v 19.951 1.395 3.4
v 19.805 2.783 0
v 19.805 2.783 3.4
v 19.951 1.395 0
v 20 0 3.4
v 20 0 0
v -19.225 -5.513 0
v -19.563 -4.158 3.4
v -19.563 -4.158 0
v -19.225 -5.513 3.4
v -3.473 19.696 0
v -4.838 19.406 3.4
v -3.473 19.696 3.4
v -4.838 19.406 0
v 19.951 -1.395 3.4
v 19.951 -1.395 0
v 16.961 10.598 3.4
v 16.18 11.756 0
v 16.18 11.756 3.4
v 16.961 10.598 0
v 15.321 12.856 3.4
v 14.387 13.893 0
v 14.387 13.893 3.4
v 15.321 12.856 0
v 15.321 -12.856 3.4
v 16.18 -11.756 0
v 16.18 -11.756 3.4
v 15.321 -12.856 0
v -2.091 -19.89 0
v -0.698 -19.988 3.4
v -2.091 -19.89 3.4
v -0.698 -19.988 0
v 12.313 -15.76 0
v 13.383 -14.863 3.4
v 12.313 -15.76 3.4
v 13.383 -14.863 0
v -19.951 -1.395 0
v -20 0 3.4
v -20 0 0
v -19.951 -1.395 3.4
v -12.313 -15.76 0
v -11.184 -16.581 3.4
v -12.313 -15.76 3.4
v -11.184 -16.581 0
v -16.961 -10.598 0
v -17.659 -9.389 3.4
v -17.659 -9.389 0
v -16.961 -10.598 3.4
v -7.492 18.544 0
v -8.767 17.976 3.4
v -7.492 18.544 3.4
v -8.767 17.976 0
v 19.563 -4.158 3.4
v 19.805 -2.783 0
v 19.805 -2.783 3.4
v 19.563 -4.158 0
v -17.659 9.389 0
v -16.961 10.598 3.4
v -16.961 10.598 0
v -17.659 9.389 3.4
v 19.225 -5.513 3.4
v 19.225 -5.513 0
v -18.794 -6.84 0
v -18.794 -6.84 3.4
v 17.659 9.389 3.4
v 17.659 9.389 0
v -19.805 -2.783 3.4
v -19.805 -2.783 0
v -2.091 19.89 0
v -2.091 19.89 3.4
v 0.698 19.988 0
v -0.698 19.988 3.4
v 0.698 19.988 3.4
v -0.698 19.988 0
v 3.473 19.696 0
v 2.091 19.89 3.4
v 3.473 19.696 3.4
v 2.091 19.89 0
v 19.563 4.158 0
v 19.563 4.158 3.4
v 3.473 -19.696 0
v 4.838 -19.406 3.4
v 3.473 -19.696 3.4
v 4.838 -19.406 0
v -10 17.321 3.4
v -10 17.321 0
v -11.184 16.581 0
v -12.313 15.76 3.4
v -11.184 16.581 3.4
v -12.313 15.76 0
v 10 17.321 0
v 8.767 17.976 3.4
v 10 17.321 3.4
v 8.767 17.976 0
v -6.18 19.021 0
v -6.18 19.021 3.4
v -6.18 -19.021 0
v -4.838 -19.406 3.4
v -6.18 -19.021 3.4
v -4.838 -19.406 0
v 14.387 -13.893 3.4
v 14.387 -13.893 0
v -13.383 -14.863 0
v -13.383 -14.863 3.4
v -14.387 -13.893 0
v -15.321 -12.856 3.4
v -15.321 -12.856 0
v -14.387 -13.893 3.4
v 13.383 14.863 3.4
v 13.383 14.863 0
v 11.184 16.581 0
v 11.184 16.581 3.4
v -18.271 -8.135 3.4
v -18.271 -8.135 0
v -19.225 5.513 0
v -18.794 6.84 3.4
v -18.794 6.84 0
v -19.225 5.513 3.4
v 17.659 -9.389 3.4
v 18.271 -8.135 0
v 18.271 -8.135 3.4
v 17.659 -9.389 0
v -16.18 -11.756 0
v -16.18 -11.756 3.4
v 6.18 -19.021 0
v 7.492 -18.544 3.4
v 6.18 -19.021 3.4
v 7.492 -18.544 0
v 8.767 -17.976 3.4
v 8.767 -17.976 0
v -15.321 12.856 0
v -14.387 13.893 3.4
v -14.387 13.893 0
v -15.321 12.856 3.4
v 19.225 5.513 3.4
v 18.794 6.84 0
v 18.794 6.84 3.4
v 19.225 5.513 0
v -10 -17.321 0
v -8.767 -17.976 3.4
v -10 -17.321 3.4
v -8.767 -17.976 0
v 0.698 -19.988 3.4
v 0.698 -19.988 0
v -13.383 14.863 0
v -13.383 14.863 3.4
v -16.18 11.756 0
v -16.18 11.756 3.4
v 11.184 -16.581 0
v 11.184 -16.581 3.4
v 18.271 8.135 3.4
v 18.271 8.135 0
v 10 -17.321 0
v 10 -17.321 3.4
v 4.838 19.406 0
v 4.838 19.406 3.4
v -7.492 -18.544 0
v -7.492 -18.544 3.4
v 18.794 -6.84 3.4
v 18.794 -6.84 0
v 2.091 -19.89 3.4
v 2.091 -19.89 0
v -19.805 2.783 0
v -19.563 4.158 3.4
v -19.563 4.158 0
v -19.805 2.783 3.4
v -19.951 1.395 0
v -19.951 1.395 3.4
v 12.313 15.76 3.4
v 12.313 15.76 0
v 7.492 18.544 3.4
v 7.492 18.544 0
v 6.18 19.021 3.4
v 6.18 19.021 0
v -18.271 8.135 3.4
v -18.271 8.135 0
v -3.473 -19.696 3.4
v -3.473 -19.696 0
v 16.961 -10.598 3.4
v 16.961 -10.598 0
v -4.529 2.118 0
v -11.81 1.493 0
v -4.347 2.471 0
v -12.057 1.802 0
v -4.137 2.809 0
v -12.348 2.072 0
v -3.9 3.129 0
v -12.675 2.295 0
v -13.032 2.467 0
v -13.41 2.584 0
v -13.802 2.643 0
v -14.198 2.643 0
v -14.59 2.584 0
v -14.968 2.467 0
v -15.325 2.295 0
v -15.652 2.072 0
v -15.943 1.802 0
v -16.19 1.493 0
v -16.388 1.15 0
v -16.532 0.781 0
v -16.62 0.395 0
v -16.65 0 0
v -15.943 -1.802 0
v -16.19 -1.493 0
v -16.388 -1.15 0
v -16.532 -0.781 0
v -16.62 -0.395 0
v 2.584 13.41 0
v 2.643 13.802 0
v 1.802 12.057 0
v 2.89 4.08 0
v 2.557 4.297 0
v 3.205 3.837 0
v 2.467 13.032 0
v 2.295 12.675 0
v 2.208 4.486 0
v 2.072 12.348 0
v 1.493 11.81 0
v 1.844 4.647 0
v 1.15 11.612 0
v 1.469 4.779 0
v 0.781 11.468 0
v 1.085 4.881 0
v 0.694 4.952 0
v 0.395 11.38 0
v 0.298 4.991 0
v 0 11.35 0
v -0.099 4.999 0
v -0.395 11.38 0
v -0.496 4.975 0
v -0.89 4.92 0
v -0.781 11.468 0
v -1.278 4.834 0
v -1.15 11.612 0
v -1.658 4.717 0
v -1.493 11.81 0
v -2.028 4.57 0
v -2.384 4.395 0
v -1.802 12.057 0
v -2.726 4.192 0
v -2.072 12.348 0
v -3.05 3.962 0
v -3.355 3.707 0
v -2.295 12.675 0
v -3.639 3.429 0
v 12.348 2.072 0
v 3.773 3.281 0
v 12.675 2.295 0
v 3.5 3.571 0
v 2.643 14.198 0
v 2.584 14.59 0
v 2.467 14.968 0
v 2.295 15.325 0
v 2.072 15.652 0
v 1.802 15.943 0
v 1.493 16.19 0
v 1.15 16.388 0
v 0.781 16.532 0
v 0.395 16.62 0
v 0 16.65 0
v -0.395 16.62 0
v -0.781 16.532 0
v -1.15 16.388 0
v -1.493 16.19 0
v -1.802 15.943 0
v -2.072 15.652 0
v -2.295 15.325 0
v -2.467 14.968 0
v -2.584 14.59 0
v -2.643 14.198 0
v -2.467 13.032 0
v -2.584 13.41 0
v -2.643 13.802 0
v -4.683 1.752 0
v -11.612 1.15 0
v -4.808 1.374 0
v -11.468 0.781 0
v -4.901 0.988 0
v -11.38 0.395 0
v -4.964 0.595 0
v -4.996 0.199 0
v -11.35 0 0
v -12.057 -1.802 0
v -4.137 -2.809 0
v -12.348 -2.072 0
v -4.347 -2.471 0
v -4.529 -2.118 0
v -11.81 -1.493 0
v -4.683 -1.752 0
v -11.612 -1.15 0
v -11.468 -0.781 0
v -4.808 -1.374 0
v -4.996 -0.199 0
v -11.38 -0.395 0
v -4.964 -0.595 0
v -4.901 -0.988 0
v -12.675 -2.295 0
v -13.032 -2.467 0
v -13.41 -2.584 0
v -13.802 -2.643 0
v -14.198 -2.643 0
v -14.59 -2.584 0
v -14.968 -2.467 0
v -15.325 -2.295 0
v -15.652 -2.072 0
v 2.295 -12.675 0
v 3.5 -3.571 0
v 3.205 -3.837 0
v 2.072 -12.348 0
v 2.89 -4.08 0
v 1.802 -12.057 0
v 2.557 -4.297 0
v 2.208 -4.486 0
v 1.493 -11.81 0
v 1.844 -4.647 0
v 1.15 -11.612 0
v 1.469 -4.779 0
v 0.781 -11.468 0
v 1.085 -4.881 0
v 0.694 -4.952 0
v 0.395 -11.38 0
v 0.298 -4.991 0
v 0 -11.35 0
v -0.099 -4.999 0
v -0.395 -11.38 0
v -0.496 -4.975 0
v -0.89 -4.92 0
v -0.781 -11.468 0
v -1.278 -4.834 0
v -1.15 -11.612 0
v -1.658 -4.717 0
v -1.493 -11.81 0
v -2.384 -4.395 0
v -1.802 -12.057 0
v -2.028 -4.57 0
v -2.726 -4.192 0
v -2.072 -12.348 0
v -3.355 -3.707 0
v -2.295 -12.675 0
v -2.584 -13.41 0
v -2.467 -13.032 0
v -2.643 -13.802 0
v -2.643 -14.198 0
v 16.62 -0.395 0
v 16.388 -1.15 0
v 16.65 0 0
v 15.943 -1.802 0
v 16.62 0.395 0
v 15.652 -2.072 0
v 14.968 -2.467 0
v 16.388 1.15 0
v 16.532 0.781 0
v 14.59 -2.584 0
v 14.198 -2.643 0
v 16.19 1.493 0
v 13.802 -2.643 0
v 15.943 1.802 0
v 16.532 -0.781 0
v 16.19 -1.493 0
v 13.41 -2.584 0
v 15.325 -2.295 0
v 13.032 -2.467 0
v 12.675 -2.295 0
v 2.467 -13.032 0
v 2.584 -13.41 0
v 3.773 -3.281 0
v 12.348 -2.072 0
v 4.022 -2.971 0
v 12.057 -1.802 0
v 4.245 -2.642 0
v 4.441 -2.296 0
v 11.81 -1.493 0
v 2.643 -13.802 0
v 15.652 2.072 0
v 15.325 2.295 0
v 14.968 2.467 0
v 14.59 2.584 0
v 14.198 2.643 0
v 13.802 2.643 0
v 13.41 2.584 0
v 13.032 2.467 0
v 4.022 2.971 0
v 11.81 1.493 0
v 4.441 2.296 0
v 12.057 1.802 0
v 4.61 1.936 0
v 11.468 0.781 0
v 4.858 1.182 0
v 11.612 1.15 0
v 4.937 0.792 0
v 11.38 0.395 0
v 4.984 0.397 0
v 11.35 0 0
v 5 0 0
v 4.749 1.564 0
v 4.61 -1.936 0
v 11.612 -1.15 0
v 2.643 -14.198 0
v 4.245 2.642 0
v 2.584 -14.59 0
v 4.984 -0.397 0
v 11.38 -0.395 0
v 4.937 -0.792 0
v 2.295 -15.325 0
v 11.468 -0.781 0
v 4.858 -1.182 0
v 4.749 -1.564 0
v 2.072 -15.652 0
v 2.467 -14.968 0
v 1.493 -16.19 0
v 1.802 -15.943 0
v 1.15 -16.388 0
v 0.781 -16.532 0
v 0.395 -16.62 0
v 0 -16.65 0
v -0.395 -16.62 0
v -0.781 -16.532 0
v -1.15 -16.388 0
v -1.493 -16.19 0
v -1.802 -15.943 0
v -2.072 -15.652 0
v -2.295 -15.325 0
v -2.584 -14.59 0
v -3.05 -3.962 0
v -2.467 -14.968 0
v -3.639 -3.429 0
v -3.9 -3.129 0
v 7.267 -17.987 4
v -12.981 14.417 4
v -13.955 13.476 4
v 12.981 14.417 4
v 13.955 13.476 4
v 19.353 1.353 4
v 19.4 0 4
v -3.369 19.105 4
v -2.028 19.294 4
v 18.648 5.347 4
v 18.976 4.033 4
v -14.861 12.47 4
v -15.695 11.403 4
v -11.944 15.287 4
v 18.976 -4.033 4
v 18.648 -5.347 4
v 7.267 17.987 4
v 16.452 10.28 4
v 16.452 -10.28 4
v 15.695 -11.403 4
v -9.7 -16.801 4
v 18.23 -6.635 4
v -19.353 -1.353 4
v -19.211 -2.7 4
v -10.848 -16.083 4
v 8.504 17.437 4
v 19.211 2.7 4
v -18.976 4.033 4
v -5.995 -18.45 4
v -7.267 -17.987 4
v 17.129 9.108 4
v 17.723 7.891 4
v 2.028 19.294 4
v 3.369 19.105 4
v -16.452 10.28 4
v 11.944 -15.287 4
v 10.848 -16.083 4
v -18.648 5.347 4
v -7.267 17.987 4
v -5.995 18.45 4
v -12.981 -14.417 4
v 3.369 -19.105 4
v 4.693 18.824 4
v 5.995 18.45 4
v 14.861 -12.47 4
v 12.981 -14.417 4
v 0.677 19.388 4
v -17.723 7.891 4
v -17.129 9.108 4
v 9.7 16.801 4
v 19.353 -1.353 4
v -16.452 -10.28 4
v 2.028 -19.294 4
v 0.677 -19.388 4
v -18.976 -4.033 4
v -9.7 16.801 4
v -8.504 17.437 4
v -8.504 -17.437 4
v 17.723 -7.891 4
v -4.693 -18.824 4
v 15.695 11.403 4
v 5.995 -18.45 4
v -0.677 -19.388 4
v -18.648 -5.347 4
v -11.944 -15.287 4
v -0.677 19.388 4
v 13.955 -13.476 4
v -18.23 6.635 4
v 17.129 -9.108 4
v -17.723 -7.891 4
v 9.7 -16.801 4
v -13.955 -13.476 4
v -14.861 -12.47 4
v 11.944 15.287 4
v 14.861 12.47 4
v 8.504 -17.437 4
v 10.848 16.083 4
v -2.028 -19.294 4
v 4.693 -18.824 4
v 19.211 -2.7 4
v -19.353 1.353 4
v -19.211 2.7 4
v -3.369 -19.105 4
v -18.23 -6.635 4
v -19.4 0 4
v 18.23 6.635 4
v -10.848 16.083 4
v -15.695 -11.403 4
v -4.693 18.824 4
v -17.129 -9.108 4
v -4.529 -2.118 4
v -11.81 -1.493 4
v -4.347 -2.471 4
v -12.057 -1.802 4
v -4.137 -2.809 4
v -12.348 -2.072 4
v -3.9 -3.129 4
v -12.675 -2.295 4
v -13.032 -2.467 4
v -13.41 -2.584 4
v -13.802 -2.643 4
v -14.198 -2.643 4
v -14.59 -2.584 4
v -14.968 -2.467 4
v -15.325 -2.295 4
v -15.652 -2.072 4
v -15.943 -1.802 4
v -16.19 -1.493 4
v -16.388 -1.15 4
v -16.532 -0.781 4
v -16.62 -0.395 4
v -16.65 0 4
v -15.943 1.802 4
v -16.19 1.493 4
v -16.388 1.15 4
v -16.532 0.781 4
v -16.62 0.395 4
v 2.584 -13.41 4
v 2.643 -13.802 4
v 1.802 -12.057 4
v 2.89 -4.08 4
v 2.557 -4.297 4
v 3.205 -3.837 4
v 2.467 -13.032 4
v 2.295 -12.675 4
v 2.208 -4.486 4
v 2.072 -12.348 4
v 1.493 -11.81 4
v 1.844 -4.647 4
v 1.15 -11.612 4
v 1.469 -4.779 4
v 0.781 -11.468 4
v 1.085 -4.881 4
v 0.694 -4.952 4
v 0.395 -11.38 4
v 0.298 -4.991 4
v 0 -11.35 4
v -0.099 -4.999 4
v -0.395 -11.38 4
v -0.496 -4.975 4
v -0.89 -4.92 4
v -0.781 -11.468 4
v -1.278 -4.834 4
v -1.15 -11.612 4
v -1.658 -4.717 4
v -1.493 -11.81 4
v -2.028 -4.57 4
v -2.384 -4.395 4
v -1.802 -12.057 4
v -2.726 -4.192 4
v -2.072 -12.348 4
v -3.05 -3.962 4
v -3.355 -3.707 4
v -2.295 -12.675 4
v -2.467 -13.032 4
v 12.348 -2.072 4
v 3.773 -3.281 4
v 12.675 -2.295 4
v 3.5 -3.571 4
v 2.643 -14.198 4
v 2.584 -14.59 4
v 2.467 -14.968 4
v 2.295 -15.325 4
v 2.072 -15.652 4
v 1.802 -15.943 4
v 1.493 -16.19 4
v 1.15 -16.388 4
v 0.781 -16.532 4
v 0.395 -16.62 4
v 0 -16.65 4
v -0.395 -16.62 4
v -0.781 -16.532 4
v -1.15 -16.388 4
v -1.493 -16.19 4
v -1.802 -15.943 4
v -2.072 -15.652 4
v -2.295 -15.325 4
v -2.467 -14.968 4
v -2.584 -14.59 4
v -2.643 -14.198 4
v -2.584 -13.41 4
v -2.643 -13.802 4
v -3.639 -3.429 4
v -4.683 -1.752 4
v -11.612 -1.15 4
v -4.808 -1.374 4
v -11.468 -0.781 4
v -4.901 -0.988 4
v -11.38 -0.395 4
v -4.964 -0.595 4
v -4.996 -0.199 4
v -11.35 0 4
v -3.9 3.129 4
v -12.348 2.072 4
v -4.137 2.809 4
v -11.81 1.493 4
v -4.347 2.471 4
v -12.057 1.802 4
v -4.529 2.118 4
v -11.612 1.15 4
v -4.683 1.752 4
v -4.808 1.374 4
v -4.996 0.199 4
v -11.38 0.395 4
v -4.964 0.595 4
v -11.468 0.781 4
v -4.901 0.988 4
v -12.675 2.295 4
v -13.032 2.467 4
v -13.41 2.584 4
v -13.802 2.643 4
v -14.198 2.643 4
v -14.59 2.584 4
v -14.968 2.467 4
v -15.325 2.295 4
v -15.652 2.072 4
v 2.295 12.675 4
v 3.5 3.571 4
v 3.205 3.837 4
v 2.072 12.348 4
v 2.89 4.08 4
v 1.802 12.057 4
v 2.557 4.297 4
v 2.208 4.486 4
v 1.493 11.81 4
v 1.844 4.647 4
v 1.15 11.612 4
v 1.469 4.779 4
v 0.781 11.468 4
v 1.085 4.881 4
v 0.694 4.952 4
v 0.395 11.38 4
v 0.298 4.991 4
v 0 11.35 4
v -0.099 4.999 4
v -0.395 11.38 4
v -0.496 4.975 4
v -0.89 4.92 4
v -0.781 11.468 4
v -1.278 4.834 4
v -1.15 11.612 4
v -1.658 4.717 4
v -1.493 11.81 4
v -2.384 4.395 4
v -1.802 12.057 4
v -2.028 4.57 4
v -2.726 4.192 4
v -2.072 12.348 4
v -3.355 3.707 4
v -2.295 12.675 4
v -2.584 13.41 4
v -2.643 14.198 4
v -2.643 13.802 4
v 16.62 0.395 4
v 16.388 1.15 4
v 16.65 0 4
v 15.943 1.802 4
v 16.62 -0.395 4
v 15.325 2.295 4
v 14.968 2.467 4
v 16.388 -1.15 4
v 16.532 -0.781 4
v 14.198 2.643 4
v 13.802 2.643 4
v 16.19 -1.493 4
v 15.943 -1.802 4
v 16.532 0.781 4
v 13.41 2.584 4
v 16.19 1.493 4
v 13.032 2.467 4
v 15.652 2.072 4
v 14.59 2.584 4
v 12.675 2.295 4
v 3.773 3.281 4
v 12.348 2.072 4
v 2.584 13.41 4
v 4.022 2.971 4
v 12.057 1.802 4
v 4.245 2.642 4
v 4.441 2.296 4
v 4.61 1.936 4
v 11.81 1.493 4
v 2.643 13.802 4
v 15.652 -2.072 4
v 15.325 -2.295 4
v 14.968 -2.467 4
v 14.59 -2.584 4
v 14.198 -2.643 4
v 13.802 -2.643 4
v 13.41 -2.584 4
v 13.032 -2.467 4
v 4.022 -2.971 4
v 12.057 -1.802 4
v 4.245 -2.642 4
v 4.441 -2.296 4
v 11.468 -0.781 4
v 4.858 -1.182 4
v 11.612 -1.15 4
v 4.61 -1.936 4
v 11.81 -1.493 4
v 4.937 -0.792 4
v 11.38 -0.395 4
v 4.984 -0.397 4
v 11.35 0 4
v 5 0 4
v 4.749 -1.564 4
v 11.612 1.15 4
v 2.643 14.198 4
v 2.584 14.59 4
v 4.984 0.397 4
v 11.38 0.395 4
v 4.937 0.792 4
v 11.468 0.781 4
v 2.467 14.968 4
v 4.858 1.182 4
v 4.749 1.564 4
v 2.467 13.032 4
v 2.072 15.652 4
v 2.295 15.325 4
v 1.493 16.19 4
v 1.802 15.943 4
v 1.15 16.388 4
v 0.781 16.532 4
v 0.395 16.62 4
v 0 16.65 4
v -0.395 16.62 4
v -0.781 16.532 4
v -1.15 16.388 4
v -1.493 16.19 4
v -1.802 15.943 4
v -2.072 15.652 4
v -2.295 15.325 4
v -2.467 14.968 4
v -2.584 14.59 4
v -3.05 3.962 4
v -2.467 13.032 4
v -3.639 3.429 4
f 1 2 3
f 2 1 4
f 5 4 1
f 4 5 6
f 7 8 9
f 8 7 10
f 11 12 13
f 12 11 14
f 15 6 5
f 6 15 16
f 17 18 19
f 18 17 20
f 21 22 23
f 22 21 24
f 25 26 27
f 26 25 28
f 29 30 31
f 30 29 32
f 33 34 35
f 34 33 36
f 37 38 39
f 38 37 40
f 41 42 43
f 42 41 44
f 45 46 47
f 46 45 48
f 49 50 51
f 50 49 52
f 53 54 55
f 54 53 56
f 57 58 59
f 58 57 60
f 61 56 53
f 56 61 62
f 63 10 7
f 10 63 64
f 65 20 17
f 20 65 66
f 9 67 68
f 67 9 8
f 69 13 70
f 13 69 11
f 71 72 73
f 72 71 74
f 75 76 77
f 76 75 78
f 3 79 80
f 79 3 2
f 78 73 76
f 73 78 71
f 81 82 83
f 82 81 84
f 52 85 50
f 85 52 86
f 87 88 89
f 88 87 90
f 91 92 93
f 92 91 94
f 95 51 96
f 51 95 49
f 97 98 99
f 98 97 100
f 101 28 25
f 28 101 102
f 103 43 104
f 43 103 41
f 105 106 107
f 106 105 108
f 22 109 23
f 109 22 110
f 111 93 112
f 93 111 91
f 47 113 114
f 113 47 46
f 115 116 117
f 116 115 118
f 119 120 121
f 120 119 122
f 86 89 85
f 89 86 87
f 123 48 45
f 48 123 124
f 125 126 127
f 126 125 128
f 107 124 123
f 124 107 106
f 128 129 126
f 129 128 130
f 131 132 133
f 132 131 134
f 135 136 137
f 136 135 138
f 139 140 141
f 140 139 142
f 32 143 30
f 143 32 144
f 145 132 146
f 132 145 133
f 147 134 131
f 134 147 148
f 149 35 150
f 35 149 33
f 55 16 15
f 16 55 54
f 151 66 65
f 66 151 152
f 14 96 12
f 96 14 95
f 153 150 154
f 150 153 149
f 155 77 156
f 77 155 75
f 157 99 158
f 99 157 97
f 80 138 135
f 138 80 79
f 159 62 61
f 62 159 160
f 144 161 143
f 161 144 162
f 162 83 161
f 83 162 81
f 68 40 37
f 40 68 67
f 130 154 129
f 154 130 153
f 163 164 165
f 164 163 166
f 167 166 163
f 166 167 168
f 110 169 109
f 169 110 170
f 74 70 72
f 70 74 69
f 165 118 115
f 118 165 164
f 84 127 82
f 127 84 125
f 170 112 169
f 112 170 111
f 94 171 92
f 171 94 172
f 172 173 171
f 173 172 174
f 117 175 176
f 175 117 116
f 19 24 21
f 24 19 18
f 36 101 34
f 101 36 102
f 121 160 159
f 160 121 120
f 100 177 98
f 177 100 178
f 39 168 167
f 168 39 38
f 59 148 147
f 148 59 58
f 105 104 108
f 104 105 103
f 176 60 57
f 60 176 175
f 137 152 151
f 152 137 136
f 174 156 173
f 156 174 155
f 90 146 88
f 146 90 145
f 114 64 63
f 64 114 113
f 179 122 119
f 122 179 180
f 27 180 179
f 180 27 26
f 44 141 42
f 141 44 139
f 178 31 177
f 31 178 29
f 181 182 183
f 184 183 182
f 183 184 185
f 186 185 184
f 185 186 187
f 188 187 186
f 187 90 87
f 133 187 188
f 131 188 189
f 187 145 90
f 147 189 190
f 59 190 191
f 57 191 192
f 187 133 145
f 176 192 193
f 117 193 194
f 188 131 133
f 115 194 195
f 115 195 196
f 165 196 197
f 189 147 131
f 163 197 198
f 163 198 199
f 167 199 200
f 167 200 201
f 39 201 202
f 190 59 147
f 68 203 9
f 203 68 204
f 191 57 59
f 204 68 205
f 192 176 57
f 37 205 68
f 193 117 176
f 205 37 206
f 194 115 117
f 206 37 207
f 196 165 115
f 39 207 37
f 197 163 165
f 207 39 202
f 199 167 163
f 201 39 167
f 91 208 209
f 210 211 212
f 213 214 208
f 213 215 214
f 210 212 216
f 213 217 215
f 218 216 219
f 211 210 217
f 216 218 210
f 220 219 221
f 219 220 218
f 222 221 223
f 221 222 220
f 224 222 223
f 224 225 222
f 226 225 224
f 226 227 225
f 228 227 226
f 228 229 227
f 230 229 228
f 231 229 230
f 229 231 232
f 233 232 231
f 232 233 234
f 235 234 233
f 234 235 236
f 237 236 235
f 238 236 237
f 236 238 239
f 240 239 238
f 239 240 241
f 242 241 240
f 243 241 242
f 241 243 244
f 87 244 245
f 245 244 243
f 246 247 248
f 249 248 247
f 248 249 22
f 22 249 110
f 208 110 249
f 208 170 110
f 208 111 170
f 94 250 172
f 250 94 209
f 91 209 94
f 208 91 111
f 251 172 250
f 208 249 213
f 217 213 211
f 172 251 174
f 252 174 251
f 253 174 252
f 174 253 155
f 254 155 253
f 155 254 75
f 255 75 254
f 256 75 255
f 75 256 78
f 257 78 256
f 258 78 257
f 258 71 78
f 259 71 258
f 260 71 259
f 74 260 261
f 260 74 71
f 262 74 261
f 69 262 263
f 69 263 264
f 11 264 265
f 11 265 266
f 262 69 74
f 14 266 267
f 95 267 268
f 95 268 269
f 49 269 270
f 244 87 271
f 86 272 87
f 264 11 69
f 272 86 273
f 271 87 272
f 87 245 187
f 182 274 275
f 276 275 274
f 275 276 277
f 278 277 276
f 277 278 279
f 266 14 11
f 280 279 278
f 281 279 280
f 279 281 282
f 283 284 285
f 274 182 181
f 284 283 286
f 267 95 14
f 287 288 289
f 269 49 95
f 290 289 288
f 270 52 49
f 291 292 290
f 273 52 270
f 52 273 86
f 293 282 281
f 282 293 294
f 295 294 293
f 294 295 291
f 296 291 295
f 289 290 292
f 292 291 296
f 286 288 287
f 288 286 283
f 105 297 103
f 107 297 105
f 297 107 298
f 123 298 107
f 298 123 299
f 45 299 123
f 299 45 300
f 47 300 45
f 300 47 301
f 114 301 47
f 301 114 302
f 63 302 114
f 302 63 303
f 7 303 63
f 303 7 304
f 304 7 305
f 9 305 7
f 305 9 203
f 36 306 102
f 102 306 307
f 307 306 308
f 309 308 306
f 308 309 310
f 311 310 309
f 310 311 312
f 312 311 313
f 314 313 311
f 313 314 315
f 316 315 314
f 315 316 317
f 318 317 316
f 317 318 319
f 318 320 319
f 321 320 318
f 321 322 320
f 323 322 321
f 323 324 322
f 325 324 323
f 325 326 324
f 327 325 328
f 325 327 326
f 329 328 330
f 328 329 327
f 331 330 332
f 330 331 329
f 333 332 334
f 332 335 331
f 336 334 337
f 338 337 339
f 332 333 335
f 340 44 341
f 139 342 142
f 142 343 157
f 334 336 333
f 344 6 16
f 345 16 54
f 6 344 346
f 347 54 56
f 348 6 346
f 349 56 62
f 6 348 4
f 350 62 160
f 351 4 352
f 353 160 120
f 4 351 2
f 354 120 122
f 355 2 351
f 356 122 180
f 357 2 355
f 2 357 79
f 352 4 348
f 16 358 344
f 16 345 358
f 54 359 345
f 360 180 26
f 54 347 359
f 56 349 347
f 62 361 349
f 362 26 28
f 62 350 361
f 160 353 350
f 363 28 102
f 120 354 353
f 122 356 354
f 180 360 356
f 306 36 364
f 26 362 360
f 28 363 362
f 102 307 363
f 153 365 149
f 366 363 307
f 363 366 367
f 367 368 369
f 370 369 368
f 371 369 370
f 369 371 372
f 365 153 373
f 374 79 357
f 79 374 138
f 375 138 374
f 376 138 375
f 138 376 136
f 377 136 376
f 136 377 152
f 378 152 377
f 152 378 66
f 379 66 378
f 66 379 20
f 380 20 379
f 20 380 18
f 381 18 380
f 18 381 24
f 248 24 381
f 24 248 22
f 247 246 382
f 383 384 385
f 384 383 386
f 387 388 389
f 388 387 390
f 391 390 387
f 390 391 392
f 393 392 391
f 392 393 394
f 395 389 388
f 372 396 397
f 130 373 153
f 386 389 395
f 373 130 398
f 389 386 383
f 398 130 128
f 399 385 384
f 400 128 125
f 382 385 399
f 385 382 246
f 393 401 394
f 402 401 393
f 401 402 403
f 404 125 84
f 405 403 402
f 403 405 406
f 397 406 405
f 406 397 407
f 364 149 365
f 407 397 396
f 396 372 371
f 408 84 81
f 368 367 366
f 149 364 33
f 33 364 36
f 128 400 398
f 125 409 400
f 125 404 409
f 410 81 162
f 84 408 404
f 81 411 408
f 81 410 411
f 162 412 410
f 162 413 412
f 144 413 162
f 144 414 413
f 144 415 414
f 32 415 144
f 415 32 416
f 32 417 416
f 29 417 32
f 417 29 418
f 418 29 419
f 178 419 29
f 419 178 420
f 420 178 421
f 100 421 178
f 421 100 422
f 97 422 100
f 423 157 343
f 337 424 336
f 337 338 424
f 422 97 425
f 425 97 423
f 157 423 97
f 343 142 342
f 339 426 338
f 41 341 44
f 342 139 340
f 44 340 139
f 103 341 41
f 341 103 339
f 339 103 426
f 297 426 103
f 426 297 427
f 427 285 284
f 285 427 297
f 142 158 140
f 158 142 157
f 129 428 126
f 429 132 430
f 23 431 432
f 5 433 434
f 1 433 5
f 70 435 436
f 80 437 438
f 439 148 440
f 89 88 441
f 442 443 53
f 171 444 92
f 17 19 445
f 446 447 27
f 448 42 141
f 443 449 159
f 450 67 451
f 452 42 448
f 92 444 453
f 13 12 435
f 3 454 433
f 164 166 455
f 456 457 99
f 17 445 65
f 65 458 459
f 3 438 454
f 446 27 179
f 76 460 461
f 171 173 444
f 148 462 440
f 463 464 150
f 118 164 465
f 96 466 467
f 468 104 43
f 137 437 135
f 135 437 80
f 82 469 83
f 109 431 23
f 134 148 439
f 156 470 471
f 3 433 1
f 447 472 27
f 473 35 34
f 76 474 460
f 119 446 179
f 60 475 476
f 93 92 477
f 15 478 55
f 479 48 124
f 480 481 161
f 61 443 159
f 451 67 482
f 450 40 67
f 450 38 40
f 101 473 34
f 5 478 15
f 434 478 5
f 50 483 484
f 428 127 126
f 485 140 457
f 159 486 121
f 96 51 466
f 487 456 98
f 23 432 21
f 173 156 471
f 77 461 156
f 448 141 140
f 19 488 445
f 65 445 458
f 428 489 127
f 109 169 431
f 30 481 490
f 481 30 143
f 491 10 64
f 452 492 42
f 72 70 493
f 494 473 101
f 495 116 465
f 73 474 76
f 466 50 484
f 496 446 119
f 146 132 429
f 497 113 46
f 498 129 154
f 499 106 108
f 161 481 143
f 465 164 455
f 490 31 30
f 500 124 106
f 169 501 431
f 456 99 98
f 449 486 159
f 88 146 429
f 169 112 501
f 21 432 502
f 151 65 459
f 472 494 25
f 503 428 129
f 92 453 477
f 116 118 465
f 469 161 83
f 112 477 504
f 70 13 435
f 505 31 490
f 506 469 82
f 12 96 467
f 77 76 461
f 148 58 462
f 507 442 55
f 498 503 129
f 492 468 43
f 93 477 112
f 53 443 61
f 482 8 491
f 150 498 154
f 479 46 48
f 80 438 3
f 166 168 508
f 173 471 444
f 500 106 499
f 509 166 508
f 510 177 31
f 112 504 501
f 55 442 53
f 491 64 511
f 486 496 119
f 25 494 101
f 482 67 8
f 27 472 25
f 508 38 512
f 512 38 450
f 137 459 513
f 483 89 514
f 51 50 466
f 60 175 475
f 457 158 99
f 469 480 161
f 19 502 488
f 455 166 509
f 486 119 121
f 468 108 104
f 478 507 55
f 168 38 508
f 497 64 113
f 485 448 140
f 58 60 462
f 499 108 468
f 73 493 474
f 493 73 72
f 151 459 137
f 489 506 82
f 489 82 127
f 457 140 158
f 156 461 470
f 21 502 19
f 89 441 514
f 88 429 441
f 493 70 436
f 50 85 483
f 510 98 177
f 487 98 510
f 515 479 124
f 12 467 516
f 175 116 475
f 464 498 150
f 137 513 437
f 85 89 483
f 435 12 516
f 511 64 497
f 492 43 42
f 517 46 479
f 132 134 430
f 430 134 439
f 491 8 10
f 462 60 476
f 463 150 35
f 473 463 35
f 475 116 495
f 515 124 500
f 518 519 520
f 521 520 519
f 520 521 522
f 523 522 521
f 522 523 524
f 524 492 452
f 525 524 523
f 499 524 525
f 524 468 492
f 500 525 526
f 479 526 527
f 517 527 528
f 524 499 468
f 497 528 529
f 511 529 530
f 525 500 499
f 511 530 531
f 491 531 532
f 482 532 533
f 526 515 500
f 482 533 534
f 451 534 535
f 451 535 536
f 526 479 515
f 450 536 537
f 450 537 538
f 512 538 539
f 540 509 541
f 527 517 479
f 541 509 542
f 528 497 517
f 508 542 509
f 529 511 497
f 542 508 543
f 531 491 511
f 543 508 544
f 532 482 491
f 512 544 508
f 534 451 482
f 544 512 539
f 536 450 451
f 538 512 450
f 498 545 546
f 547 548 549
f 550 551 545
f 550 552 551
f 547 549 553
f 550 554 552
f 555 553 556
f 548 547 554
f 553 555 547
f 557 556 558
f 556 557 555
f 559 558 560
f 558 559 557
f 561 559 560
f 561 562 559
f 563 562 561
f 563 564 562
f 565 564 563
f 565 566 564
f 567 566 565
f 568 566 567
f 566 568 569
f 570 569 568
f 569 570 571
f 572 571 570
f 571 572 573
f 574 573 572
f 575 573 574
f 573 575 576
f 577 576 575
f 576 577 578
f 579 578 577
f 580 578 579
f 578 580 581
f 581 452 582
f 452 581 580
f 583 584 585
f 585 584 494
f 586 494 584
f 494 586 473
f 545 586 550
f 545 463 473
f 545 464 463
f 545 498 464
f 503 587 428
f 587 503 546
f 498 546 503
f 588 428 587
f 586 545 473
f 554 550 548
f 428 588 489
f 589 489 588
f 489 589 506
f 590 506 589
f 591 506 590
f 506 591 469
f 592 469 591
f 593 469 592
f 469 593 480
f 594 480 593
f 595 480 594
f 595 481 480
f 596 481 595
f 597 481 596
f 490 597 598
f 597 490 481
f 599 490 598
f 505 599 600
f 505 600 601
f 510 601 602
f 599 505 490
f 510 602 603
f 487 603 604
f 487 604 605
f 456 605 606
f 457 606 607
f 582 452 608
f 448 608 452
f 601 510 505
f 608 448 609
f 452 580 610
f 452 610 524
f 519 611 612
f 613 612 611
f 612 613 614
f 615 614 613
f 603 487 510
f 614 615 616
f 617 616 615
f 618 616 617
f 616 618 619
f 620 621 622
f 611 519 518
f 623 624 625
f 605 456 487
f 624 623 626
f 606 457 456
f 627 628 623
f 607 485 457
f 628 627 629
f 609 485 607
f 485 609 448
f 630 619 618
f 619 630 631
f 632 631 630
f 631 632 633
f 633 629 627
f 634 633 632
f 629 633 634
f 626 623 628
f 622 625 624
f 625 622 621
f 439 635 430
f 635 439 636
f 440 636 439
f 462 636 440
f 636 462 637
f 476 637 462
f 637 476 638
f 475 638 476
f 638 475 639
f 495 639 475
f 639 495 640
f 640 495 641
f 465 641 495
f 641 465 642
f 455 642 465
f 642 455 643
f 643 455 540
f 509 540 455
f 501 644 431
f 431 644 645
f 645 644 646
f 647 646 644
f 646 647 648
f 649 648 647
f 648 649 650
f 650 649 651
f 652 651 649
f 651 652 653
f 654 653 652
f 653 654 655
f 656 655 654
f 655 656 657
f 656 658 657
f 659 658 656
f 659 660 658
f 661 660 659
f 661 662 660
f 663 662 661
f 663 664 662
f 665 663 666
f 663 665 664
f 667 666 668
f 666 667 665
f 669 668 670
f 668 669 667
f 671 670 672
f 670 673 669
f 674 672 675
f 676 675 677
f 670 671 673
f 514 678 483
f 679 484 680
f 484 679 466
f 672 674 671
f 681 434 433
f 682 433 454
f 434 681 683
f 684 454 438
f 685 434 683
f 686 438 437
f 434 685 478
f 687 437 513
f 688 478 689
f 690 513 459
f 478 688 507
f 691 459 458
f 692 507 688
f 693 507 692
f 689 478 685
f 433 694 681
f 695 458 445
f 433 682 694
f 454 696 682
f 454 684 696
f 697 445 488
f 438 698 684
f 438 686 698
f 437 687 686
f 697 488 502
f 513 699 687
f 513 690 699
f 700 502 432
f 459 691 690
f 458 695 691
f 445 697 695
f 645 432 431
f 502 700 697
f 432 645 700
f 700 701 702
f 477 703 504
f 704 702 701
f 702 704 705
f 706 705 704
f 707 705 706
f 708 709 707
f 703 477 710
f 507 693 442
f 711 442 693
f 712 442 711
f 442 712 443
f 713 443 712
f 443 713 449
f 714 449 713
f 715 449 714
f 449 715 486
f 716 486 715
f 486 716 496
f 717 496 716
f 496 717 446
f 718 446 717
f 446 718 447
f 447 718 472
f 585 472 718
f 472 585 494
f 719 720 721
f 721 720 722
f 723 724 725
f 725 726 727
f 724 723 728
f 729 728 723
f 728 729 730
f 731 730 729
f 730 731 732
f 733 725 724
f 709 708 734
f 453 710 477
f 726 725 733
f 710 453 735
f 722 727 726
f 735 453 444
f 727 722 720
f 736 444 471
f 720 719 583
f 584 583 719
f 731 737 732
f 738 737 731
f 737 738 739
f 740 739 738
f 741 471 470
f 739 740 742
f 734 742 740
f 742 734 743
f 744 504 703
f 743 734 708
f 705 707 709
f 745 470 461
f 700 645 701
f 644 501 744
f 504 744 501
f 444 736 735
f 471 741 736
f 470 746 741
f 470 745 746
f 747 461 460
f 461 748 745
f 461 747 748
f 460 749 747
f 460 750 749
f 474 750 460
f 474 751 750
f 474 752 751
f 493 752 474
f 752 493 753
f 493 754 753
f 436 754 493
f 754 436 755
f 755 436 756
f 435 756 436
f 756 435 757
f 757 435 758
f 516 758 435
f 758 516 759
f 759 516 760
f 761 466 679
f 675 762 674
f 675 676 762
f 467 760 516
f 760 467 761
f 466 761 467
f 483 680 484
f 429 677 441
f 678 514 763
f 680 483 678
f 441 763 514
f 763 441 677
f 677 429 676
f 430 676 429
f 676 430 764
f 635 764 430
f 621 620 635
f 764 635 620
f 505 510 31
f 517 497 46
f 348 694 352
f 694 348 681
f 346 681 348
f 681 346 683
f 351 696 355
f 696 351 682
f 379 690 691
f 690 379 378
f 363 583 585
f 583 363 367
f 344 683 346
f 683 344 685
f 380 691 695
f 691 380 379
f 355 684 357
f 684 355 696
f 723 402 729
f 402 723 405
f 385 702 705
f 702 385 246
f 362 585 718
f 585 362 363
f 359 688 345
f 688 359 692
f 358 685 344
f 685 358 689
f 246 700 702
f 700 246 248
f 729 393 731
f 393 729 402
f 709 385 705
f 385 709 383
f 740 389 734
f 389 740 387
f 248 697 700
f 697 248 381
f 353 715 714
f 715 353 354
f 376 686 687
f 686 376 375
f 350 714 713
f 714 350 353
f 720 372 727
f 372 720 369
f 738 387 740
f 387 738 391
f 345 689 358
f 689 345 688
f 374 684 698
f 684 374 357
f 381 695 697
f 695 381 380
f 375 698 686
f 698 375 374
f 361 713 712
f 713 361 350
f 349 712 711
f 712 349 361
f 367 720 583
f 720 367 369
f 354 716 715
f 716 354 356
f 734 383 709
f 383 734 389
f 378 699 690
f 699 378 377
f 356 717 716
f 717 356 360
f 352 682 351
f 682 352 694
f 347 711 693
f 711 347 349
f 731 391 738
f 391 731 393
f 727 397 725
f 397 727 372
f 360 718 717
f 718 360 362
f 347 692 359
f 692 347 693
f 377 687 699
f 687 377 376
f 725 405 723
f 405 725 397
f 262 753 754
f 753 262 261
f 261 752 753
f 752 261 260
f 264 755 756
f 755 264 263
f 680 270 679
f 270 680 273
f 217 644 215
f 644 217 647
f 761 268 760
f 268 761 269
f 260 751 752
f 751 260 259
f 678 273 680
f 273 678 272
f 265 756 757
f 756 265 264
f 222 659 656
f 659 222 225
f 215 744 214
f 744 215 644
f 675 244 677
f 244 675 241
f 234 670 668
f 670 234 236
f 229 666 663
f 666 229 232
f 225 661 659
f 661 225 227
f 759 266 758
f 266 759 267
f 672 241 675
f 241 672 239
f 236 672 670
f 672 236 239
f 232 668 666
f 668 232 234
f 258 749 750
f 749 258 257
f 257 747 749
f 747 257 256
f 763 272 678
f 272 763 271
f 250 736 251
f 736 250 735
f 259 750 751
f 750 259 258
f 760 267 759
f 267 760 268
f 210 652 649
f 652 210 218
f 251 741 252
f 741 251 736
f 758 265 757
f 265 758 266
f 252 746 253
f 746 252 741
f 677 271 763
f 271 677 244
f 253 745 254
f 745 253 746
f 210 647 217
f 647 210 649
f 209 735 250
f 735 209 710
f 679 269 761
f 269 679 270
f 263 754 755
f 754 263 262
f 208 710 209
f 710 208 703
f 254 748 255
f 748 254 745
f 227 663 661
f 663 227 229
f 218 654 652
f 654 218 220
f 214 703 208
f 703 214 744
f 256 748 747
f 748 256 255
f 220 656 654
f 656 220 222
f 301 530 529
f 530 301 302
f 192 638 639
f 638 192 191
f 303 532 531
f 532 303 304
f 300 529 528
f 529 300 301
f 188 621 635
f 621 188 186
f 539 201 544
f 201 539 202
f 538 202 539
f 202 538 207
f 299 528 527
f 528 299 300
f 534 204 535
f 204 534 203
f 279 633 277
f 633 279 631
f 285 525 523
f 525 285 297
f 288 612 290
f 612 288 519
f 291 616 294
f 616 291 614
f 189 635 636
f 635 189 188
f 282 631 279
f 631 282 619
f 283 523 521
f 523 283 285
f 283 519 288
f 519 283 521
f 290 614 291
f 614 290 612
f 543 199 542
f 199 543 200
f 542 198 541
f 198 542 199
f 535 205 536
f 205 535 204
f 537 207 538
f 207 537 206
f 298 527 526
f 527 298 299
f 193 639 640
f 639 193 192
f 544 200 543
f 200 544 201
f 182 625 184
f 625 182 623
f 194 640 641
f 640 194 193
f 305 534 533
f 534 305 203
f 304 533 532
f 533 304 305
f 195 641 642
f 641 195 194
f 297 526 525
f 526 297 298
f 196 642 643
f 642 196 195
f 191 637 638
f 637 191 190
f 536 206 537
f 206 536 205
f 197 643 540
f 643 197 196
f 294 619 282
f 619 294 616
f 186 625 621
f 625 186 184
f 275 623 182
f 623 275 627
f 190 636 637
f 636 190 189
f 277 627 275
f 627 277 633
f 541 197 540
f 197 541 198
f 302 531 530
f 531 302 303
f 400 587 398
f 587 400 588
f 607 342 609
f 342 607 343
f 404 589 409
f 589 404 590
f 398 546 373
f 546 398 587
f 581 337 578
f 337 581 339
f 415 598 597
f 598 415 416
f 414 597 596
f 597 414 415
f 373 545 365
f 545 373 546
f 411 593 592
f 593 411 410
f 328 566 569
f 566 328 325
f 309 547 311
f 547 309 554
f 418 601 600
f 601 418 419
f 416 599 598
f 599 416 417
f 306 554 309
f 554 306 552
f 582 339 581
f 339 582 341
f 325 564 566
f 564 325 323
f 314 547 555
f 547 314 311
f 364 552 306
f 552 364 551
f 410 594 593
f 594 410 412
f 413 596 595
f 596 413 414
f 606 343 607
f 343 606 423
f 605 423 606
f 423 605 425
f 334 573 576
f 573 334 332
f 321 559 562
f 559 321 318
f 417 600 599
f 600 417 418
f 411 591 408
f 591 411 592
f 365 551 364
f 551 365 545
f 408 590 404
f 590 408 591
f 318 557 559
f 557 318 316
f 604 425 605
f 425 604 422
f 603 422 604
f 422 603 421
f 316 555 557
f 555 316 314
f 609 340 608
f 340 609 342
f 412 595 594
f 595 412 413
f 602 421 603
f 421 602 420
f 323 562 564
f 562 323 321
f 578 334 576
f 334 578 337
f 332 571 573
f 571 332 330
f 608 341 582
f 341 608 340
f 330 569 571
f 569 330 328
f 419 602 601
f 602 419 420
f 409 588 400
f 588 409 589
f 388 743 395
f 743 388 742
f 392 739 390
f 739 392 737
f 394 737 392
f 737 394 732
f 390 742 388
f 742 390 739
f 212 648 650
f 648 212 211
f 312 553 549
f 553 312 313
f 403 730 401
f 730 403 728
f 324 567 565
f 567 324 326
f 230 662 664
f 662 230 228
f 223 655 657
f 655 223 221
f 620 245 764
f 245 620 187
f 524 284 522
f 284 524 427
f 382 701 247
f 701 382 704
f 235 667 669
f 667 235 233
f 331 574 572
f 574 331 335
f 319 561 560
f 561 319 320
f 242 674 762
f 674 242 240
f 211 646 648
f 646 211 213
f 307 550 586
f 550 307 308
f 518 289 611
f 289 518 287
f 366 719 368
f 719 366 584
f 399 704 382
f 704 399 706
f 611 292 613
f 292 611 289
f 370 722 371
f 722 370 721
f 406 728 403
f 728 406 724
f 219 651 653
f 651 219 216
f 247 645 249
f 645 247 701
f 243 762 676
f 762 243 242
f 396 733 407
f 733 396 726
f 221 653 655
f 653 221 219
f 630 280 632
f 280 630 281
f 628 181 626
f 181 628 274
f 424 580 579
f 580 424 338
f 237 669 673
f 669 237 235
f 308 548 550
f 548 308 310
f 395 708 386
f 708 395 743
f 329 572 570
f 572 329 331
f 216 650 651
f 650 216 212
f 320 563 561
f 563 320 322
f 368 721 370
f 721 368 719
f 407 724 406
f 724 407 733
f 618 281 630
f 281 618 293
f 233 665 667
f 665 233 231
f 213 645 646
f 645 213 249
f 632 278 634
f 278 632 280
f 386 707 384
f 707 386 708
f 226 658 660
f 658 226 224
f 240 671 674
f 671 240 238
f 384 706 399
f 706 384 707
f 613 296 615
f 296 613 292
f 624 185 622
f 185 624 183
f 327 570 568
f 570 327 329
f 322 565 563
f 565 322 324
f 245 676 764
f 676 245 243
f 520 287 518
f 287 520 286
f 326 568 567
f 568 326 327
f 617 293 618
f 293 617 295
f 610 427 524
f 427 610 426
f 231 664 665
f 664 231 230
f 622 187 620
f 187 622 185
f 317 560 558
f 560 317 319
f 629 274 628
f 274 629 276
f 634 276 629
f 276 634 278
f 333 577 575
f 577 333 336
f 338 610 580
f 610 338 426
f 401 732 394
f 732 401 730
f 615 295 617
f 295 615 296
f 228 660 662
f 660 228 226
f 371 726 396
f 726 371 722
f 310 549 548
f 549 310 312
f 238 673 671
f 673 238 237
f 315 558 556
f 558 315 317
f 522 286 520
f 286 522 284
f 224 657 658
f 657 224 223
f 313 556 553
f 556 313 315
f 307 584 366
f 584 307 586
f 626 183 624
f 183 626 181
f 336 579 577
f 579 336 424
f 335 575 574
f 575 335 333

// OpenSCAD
// M5 bolt flange: OD 40, thickness 4, PCD 28, four clearance holes.
$fa = 4;
$fs = 0.4;

/* [Dimensions] */

// Outer diameter of the flange.
outer_dia = 40; // [20:1:80]

// Plate thickness.
thickness = 4; // [2:0.5:12]

// Center bore.
inner_dia = 10; // [4:0.5:24]

// Bolt circle diameter.
pcd = 28; // [16:1:70]

// Number of bolt holes.
bolt_count = 4; // [3:1:12]

/* [Hidden] */

// M5 clearance (ISO 273 normal fit). Standard-part — not a main knob.
bolt_clearance_dia = 5.3; // [3:0.1:8]

// Bed-face chamfer (elephant-foot relief). Print detail — most users keep the default.
bed_chamfer = 0.6; // [0:0.1:1.2]

/* [Rendering] */

flange_color = "#2A9D90"; // color

flange();

module flange(
    outer_dia = outer_dia,
    thickness = thickness,
    inner_dia = inner_dia,
    pcd = pcd,
    bolt_count = bolt_count,
    bolt_clearance_dia = bolt_clearance_dia,
    bed_chamfer = bed_chamfer,
    flange_color = flange_color
) {
    color(flange_color)
    difference() {
        union() {
            cylinder(d = outer_dia, h = thickness - bed_chamfer);
            translate([0, 0, thickness - bed_chamfer])
                cylinder(d1 = outer_dia, d2 = outer_dia - 2 * bed_chamfer, h = bed_chamfer);
        }
        translate([0, 0, -1])
            cylinder(d = inner_dia, h = thickness + 2);
        for (i = [0 : bolt_count - 1])
            rotate(i * 360 / bolt_count)
                translate([pcd / 2, 0, -1])
                    cylinder(d = bolt_clearance_dia, h = thickness + 2);
    }
}
